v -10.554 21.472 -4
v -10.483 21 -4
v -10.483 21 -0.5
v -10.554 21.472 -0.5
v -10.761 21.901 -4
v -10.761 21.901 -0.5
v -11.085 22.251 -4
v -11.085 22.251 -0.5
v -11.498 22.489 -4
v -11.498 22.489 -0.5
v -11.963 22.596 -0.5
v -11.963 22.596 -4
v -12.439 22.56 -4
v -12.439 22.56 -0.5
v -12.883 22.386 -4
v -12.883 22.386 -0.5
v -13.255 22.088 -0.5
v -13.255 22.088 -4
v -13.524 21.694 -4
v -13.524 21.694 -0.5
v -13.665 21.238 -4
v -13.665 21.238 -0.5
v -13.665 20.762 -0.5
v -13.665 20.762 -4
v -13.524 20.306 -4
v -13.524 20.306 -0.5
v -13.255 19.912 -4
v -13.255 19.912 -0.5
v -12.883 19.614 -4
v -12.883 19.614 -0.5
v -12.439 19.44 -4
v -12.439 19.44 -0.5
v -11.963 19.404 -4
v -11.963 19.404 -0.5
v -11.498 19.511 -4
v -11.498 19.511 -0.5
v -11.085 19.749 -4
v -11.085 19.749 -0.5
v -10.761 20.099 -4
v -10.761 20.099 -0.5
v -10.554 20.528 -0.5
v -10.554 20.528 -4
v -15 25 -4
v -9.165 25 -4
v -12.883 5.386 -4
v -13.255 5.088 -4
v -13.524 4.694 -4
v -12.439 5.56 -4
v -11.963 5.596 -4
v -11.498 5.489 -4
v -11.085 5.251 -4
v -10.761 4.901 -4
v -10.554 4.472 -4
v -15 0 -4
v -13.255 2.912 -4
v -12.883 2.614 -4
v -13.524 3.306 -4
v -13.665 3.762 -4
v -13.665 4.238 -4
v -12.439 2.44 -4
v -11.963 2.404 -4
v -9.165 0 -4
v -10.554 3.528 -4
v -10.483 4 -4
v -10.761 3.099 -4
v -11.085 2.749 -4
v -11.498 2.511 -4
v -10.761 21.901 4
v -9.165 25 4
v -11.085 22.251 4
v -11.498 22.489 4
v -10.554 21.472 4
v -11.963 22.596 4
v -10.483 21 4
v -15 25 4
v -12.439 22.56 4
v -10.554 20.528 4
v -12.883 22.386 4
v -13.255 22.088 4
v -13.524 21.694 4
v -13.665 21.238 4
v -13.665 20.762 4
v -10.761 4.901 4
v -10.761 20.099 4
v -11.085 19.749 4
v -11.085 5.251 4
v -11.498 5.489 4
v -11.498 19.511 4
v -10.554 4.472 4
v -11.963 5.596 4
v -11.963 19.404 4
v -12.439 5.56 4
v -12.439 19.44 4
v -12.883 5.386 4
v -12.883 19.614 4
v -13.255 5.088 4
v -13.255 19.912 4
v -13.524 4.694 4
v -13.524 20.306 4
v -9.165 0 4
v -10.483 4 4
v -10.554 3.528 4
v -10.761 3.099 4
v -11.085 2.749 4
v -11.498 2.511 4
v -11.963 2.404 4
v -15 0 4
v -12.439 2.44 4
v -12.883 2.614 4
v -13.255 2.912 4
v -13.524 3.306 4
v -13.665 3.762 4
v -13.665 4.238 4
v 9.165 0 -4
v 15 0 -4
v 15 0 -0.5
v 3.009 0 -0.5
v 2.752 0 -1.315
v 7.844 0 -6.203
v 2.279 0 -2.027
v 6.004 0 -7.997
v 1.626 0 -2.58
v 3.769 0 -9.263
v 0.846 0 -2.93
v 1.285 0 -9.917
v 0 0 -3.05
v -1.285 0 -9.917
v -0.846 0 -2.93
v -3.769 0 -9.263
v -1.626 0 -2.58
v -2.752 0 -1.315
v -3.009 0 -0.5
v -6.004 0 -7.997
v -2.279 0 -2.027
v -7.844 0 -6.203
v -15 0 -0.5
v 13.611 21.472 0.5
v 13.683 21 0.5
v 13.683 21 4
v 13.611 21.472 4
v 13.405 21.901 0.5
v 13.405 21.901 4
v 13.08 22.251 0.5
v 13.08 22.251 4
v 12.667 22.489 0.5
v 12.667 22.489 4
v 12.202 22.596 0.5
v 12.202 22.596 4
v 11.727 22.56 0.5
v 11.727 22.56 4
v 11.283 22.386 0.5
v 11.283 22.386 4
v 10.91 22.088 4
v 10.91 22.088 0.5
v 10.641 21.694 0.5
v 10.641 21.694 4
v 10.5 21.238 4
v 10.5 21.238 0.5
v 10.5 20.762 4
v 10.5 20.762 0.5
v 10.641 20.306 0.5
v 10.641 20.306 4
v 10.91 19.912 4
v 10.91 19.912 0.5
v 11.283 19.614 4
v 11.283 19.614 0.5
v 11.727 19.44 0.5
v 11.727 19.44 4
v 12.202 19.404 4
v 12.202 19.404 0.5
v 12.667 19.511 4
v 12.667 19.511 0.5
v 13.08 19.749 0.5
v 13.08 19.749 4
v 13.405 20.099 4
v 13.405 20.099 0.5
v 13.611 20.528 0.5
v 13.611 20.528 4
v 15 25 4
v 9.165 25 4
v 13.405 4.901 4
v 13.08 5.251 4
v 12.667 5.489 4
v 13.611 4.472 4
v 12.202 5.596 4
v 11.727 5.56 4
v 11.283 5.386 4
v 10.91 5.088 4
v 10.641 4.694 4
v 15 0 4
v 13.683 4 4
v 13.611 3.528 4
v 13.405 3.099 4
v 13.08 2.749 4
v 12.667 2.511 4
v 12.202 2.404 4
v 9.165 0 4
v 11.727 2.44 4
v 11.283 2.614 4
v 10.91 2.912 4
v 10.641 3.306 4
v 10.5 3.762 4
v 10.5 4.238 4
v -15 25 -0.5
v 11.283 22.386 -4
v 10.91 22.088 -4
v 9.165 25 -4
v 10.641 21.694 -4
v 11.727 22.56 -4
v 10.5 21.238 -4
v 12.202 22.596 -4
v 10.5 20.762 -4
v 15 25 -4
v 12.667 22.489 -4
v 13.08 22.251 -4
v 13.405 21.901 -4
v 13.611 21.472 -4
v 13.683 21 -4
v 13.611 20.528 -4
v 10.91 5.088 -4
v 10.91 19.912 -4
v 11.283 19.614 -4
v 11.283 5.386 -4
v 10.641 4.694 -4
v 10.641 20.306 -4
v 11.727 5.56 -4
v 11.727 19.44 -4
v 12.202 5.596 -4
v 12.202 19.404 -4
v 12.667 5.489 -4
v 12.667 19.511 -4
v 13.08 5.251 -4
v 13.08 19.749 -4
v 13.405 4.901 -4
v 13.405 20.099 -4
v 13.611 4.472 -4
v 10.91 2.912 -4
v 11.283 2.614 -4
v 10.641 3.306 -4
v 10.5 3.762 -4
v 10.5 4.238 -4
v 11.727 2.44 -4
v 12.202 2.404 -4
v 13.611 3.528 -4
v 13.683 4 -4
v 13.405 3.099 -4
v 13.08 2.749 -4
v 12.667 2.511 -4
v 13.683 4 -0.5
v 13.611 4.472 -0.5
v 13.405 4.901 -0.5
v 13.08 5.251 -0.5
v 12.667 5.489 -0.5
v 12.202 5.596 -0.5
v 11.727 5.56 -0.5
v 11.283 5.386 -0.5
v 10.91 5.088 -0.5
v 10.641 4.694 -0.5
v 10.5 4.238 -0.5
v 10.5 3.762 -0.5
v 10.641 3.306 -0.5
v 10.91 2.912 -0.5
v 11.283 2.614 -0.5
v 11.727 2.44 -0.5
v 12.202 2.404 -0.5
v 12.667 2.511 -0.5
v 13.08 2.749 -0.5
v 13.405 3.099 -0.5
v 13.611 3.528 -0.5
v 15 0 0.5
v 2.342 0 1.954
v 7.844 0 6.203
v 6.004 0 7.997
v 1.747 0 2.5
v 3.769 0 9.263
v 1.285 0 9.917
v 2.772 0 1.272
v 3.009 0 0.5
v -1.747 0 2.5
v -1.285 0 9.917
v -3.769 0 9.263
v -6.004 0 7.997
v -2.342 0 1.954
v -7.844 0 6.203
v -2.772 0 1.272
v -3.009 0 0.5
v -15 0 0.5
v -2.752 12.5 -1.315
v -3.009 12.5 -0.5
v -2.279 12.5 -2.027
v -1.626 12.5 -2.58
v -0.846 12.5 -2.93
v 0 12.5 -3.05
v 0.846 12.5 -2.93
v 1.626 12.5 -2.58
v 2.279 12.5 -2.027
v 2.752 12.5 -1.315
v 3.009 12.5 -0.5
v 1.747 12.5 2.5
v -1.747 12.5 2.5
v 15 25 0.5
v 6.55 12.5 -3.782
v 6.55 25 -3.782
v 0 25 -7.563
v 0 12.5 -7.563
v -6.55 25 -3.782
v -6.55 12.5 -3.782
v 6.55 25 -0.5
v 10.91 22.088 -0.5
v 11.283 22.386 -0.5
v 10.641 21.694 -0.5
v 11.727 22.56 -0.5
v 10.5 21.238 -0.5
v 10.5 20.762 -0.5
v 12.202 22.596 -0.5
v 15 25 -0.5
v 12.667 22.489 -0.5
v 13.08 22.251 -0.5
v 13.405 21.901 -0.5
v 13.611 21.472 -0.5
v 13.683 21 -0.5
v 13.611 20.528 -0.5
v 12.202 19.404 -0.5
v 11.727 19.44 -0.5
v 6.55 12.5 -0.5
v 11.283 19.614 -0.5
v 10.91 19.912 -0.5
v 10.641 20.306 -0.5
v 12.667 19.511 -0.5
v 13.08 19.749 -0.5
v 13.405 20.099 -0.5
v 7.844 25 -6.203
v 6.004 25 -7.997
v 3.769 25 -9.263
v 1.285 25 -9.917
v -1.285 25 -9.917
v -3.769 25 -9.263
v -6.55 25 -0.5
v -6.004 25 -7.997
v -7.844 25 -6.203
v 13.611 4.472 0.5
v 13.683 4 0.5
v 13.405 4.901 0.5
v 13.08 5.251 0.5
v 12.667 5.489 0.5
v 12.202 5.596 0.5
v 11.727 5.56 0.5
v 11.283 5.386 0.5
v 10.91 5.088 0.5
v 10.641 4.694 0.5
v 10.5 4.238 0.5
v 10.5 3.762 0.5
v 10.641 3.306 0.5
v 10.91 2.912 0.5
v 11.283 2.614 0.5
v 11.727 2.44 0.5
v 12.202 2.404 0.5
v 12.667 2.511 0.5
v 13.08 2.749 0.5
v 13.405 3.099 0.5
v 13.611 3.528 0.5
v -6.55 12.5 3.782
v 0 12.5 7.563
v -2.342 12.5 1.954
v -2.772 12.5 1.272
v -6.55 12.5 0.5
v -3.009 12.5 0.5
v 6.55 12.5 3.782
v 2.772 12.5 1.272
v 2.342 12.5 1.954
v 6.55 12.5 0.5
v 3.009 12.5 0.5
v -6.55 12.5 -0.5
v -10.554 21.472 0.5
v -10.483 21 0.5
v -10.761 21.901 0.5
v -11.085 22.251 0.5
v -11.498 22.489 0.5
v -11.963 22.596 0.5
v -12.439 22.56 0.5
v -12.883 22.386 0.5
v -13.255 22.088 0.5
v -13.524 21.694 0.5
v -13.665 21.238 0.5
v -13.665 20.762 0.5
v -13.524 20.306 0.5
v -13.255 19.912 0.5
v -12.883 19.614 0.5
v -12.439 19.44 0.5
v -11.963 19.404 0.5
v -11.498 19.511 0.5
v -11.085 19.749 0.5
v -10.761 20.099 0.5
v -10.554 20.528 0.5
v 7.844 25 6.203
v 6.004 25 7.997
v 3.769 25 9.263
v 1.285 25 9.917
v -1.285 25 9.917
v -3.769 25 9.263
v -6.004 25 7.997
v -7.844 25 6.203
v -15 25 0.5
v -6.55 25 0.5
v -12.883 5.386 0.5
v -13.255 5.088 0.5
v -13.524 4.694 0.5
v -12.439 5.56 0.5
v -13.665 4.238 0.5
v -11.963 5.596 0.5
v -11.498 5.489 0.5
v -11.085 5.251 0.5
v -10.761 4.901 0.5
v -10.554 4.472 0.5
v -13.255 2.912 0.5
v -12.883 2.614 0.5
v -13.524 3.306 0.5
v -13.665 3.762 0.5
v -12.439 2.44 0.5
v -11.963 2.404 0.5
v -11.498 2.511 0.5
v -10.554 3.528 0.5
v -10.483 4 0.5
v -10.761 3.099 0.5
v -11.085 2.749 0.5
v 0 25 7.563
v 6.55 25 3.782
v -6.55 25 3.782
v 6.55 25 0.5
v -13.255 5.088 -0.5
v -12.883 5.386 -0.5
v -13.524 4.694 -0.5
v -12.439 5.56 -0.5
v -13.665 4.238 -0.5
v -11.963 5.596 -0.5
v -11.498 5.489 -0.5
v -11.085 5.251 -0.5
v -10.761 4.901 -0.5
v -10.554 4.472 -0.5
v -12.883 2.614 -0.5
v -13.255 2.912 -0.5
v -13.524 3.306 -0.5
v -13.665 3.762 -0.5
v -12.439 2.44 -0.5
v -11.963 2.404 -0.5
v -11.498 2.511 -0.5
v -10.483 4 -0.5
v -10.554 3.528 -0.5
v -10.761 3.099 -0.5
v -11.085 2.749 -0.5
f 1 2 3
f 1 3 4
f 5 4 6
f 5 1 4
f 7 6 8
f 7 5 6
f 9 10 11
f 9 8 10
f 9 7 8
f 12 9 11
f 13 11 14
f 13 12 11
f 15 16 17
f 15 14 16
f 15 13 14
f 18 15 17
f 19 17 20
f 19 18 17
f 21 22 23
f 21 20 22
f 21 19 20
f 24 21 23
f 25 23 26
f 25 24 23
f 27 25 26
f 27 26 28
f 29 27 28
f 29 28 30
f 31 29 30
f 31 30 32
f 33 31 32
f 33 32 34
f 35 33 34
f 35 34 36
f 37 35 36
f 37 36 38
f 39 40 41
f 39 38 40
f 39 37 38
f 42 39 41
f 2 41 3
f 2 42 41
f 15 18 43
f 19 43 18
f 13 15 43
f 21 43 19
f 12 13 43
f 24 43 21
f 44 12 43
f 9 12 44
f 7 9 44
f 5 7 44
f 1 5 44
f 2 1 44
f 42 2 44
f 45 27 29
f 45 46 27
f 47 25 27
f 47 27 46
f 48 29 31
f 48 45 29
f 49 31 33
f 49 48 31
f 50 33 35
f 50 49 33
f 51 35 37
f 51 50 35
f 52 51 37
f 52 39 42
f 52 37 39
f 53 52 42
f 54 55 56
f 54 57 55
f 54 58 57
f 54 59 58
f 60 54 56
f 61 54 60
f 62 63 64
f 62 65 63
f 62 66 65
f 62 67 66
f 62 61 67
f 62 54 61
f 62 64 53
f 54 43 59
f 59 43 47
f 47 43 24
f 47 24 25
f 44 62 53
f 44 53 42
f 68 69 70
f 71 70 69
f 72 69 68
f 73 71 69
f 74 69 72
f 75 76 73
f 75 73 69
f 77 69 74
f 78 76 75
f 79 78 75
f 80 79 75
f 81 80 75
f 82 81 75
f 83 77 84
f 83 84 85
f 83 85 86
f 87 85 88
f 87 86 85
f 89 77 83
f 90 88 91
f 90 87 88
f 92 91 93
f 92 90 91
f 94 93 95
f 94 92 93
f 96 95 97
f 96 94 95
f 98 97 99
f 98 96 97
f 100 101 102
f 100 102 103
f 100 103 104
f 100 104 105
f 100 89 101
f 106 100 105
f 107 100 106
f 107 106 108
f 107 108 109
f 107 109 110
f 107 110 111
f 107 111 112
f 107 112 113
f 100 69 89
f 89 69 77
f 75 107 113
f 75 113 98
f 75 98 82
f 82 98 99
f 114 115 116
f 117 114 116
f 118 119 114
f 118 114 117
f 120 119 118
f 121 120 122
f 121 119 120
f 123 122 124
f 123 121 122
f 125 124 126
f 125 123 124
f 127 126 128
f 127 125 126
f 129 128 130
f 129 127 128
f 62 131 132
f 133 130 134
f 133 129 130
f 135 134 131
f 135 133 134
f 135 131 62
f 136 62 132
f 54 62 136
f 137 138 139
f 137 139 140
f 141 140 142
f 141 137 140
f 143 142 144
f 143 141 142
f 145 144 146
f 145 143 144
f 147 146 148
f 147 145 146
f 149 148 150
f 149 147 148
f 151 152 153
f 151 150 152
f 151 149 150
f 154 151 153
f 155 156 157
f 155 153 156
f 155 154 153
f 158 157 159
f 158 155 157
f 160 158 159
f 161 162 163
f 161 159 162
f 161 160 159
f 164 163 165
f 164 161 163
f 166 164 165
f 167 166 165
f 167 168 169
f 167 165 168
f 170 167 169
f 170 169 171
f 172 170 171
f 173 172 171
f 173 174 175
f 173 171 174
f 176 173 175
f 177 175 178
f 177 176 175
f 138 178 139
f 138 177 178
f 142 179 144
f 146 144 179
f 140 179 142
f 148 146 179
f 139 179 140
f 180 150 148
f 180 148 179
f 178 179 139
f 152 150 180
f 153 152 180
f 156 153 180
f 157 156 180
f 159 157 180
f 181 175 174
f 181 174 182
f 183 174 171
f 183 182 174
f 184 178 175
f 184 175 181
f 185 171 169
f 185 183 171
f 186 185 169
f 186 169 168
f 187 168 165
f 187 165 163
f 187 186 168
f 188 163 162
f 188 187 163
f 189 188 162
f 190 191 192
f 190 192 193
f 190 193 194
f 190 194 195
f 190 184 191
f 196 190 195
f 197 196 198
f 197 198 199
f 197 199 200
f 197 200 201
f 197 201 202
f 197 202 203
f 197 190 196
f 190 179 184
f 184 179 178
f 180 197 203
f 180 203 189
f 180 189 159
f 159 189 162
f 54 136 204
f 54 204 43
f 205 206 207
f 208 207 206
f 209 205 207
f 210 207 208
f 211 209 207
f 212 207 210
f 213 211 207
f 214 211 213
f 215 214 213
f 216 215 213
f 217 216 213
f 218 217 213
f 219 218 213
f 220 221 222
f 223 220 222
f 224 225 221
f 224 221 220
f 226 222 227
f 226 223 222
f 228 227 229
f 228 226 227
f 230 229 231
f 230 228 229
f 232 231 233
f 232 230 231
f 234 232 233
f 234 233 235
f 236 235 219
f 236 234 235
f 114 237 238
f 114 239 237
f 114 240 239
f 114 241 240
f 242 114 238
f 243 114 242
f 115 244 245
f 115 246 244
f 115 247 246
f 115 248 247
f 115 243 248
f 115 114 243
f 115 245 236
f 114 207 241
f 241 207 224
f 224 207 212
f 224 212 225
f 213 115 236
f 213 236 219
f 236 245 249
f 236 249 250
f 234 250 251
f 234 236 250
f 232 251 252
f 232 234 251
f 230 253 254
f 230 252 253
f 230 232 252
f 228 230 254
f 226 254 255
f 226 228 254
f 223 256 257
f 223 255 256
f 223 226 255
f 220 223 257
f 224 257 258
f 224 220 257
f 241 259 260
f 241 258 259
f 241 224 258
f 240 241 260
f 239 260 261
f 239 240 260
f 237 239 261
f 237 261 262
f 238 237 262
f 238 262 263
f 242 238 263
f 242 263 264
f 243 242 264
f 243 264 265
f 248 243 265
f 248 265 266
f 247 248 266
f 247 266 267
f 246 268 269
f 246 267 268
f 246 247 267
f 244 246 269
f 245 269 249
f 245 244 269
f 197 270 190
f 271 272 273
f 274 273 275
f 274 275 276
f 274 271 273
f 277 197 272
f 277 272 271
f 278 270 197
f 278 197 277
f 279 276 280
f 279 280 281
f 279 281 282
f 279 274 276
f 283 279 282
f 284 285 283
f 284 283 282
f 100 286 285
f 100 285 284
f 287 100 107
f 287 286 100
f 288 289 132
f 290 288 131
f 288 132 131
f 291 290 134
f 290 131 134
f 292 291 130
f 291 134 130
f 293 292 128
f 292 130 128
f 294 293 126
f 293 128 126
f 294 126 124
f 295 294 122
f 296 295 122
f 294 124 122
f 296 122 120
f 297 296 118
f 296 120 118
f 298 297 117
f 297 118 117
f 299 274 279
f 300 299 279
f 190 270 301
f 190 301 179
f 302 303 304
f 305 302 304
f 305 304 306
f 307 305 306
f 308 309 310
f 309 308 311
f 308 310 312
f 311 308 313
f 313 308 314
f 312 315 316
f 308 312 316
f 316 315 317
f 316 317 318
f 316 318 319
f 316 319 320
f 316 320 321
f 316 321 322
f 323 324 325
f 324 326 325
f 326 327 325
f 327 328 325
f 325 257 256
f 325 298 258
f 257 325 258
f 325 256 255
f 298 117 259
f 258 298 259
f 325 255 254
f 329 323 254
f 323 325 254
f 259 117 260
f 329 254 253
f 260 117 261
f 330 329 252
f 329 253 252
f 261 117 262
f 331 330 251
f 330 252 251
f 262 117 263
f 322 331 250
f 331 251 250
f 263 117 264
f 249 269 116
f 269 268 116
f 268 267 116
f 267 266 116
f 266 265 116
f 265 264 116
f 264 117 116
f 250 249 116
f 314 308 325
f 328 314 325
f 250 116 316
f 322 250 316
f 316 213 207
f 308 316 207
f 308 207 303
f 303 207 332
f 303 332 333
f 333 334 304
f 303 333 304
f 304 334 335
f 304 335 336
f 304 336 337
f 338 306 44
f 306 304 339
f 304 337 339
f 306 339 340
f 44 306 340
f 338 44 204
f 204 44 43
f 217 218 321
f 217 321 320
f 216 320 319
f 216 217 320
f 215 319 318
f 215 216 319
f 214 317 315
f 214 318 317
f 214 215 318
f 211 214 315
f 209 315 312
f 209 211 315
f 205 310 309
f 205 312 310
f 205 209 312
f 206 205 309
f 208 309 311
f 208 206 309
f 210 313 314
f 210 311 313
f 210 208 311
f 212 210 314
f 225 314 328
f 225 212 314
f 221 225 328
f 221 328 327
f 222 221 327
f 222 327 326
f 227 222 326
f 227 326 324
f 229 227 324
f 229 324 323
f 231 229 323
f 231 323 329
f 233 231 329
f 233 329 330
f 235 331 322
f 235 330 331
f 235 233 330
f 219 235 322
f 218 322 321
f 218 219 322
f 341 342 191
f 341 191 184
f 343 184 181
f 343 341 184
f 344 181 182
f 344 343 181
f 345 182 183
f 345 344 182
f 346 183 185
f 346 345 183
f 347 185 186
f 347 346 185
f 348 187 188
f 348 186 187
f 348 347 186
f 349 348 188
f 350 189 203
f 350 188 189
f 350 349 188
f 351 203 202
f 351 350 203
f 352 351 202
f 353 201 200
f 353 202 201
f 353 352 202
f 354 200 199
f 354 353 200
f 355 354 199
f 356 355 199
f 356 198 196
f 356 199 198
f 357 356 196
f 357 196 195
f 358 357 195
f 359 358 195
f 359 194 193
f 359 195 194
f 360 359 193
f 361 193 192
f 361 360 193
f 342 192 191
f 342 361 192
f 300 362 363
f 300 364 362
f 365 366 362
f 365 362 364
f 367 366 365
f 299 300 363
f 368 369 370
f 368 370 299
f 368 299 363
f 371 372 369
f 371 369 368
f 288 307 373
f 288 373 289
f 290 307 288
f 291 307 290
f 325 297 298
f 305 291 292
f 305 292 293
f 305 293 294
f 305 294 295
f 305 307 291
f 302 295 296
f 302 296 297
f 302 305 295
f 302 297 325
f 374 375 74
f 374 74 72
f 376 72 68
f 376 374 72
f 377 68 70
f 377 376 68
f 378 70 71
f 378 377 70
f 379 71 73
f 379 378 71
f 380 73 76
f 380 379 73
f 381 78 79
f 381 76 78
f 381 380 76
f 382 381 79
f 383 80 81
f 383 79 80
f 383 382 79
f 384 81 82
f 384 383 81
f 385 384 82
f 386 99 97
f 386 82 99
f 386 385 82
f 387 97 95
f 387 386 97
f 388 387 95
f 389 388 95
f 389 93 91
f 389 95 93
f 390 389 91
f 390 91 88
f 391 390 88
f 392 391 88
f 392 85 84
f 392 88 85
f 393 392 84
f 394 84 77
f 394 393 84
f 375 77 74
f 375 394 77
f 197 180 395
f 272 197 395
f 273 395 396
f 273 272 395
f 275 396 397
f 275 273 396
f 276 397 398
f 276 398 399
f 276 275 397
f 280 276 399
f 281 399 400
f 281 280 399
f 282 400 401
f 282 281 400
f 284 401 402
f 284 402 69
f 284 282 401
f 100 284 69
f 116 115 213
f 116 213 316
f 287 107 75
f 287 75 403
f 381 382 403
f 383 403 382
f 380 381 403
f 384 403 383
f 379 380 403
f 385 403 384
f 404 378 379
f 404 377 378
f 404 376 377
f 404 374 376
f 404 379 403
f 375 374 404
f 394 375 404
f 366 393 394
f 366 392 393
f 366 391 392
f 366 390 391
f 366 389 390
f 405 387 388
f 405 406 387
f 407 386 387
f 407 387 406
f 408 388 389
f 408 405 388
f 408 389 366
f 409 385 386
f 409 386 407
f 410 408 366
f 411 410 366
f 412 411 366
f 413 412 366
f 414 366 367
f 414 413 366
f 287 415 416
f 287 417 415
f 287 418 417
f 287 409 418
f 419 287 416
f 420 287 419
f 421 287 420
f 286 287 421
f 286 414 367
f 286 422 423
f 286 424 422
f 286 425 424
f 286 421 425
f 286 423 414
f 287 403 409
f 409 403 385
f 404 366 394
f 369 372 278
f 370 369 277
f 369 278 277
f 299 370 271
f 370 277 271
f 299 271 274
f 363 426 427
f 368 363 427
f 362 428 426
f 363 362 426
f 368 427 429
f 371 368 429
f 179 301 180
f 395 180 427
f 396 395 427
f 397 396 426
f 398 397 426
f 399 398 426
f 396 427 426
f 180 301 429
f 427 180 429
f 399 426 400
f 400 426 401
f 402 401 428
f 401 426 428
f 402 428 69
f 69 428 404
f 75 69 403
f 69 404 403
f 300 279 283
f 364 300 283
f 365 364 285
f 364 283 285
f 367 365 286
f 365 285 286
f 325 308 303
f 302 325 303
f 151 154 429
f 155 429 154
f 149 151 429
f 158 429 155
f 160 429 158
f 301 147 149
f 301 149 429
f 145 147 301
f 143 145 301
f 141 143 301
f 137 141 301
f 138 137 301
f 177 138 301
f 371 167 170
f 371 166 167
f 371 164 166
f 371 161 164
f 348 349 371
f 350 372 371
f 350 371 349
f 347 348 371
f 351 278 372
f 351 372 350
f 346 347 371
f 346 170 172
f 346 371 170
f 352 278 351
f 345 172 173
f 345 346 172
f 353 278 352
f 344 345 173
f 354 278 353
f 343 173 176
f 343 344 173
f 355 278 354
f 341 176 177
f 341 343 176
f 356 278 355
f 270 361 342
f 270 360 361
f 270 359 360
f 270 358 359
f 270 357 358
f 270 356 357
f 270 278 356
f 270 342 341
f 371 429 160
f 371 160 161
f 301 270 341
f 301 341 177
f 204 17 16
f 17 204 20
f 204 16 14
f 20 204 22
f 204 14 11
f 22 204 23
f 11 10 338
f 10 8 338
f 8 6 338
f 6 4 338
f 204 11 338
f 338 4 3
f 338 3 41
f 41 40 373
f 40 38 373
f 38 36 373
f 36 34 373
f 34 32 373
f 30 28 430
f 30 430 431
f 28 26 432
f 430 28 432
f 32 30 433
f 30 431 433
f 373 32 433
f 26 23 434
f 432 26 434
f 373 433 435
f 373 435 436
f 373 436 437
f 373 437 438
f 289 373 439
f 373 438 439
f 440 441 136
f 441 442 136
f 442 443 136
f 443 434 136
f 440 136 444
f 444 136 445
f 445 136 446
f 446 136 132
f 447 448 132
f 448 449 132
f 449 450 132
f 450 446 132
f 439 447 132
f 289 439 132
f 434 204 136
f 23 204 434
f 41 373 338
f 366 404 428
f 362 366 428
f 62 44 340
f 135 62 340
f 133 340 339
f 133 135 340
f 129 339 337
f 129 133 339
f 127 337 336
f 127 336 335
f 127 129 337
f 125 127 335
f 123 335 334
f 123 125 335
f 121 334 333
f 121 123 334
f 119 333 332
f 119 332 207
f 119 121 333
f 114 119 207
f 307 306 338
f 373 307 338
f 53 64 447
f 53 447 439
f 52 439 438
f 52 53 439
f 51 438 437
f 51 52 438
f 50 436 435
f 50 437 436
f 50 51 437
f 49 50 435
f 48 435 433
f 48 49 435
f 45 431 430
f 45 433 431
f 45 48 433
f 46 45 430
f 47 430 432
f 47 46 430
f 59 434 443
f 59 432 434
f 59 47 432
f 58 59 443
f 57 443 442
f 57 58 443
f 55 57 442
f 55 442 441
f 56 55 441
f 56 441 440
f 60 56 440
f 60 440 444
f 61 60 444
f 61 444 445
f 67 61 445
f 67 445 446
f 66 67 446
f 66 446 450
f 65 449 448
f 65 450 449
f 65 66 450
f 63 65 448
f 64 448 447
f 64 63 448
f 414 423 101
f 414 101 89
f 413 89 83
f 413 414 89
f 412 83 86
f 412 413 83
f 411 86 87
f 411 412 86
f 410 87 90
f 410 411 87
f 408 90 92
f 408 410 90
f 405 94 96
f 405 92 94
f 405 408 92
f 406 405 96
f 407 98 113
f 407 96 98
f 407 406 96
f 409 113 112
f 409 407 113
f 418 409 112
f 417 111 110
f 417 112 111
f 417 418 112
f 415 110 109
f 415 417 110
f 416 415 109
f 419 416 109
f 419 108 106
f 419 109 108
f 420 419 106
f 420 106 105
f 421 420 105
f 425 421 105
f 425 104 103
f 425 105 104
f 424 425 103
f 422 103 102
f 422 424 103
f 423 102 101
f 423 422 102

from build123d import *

# Parameters (mm, degrees)
EXTRUDE_1_DEPTH          = 25
CUT_EXTRUDE_1_DEPTH      = 12.5
CUT_EXTRUDE_2_DEPTH      = 12.5
SKETCH_4_W               = 30
SKETCH_4_H               = 1
CUT_EXTRUDE_3_DEPTH      = 31.822070015
CUT_EXTRUDE_4_DEPTH      = 31.822070015
CUT_EXTRUDE_4_DEPTH_BACK = 31.822070015
SKETCH_5_R               = 1.6


with BuildPart() as part:
    # ｽｹｯﾁ1 → ﾎﾞｽ - 押し出し1 (new body)
    with BuildSketch(Plane(origin=(0, 0, 0), x_dir=(1, 0, 0), z_dir=(0, 1, 0))):
        with BuildLine():
            Line((9.16515139, 4), (15, 4))
            Line((15, 4), (15, -4))
            Line((15, -4), (9.16515139, -4))
            ThreePointArc((9.16515139, -4), (0, -10), (-9.16515139, -4))
            Line((-9.16515139, -4), (-15, -4))
            Line((-15, -4), (-15, 4))
            Line((-15, 4), (-9.16515139, 4))
            ThreePointArc((-9.16515139, 4), (0, 10), (9.16515139, 4))
        make_face()
    extrude(amount=EXTRUDE_1_DEPTH)

    # ｽｹｯﾁ2 → ｶｯﾄ - 押し出し1 (cut)
    with BuildSketch(Plane.XZ):
        with BuildLine():
            Line((1.747140521, 2.5), (-1.747140521, 2.5))
            ThreePointArc((-1.747140521, 2.5), (0, -3.05), (1.747140521, 2.5))
        make_face()
    extrude(amount=-CUT_EXTRUDE_1_DEPTH, mode=Mode.SUBTRACT)

    # ｽｹｯﾁ3 → ｶｯﾄ - 押し出し2 (cut)
    with BuildSketch(Plane(origin=(0, 25, 0), x_dir=(1, 0, 0), z_dir=(0, 1, 0))):
        Polygon((0, -7.563288526), (6.55, -3.781644263), (6.55, 3.781644263), (0, 7.563288526), (-6.55, 3.781644263), (-6.55, -3.781644263), align=None)
    extrude(amount=-CUT_EXTRUDE_2_DEPTH, mode=Mode.SUBTRACT)

    # ｽｹｯﾁ4 → ｶｯﾄ - 押し出し3 (cut, through all)
    with BuildSketch(Plane(origin=(0, 0, 0), x_dir=(1, 0, 0), z_dir=(0, 1, 0))):
        Rectangle(SKETCH_4_W, SKETCH_4_H)
    extrude(amount=CUT_EXTRUDE_3_DEPTH, mode=Mode.SUBTRACT)


with BuildPart() as cut_extrude_3_piece_1:
    # of the separate pieces the step leaves, piece 1, a body of its own (cut_extrude_3_pieces)
    add(part.part.solids().sort_by_distance((15, 0, 0.5))[0])


with BuildPart() as cut_extrude_3_piece_2:
    # of the separate pieces the step leaves, piece 2, a body of its own (cut_extrude_3_pieces)
    add(part.part.solids().sort_by_distance((9.16515139, 0, -4))[0])


with BuildPart() as cut_extrude_4_tool:
    # ｽｹｯﾁ5 → ｶｯﾄ - 押し出し4 (new, two sides: drawn at the far end of the back side and taken through both)
    with BuildSketch(Plane.XY.offset(-CUT_EXTRUDE_4_DEPTH_BACK)):
        with Locations((-12.082575695, 21)):
            Circle(SKETCH_5_R)
        with Locations((12.082575695, 21)):
            Circle(SKETCH_5_R)
        with Locations((-12.082575695, 4)):
            Circle(SKETCH_5_R)
        with Locations((12.082575695, 4)):
            Circle(SKETCH_5_R)
    extrude(amount=CUT_EXTRUDE_4_DEPTH + CUT_EXTRUDE_4_DEPTH_BACK)


with BuildPart() as cut_extrude_3_piece_1_1:
    add(cut_extrude_3_piece_1.part)

    # ｶｯﾄ - 押し出し4: cut by cut_extrude_4_tool
    add(cut_extrude_4_tool.part, mode=Mode.SUBTRACT)


with BuildPart() as cut_extrude_3_piece_2_1:
    add(cut_extrude_3_piece_2.part)

    # ｶｯﾄ - 押し出し4: cut by cut_extrude_4_tool
    add(cut_extrude_4_tool.part, mode=Mode.SUBTRACT)


solid = Compound([cut_extrude_3_piece_1_1.part, cut_extrude_3_piece_2_1.part])
